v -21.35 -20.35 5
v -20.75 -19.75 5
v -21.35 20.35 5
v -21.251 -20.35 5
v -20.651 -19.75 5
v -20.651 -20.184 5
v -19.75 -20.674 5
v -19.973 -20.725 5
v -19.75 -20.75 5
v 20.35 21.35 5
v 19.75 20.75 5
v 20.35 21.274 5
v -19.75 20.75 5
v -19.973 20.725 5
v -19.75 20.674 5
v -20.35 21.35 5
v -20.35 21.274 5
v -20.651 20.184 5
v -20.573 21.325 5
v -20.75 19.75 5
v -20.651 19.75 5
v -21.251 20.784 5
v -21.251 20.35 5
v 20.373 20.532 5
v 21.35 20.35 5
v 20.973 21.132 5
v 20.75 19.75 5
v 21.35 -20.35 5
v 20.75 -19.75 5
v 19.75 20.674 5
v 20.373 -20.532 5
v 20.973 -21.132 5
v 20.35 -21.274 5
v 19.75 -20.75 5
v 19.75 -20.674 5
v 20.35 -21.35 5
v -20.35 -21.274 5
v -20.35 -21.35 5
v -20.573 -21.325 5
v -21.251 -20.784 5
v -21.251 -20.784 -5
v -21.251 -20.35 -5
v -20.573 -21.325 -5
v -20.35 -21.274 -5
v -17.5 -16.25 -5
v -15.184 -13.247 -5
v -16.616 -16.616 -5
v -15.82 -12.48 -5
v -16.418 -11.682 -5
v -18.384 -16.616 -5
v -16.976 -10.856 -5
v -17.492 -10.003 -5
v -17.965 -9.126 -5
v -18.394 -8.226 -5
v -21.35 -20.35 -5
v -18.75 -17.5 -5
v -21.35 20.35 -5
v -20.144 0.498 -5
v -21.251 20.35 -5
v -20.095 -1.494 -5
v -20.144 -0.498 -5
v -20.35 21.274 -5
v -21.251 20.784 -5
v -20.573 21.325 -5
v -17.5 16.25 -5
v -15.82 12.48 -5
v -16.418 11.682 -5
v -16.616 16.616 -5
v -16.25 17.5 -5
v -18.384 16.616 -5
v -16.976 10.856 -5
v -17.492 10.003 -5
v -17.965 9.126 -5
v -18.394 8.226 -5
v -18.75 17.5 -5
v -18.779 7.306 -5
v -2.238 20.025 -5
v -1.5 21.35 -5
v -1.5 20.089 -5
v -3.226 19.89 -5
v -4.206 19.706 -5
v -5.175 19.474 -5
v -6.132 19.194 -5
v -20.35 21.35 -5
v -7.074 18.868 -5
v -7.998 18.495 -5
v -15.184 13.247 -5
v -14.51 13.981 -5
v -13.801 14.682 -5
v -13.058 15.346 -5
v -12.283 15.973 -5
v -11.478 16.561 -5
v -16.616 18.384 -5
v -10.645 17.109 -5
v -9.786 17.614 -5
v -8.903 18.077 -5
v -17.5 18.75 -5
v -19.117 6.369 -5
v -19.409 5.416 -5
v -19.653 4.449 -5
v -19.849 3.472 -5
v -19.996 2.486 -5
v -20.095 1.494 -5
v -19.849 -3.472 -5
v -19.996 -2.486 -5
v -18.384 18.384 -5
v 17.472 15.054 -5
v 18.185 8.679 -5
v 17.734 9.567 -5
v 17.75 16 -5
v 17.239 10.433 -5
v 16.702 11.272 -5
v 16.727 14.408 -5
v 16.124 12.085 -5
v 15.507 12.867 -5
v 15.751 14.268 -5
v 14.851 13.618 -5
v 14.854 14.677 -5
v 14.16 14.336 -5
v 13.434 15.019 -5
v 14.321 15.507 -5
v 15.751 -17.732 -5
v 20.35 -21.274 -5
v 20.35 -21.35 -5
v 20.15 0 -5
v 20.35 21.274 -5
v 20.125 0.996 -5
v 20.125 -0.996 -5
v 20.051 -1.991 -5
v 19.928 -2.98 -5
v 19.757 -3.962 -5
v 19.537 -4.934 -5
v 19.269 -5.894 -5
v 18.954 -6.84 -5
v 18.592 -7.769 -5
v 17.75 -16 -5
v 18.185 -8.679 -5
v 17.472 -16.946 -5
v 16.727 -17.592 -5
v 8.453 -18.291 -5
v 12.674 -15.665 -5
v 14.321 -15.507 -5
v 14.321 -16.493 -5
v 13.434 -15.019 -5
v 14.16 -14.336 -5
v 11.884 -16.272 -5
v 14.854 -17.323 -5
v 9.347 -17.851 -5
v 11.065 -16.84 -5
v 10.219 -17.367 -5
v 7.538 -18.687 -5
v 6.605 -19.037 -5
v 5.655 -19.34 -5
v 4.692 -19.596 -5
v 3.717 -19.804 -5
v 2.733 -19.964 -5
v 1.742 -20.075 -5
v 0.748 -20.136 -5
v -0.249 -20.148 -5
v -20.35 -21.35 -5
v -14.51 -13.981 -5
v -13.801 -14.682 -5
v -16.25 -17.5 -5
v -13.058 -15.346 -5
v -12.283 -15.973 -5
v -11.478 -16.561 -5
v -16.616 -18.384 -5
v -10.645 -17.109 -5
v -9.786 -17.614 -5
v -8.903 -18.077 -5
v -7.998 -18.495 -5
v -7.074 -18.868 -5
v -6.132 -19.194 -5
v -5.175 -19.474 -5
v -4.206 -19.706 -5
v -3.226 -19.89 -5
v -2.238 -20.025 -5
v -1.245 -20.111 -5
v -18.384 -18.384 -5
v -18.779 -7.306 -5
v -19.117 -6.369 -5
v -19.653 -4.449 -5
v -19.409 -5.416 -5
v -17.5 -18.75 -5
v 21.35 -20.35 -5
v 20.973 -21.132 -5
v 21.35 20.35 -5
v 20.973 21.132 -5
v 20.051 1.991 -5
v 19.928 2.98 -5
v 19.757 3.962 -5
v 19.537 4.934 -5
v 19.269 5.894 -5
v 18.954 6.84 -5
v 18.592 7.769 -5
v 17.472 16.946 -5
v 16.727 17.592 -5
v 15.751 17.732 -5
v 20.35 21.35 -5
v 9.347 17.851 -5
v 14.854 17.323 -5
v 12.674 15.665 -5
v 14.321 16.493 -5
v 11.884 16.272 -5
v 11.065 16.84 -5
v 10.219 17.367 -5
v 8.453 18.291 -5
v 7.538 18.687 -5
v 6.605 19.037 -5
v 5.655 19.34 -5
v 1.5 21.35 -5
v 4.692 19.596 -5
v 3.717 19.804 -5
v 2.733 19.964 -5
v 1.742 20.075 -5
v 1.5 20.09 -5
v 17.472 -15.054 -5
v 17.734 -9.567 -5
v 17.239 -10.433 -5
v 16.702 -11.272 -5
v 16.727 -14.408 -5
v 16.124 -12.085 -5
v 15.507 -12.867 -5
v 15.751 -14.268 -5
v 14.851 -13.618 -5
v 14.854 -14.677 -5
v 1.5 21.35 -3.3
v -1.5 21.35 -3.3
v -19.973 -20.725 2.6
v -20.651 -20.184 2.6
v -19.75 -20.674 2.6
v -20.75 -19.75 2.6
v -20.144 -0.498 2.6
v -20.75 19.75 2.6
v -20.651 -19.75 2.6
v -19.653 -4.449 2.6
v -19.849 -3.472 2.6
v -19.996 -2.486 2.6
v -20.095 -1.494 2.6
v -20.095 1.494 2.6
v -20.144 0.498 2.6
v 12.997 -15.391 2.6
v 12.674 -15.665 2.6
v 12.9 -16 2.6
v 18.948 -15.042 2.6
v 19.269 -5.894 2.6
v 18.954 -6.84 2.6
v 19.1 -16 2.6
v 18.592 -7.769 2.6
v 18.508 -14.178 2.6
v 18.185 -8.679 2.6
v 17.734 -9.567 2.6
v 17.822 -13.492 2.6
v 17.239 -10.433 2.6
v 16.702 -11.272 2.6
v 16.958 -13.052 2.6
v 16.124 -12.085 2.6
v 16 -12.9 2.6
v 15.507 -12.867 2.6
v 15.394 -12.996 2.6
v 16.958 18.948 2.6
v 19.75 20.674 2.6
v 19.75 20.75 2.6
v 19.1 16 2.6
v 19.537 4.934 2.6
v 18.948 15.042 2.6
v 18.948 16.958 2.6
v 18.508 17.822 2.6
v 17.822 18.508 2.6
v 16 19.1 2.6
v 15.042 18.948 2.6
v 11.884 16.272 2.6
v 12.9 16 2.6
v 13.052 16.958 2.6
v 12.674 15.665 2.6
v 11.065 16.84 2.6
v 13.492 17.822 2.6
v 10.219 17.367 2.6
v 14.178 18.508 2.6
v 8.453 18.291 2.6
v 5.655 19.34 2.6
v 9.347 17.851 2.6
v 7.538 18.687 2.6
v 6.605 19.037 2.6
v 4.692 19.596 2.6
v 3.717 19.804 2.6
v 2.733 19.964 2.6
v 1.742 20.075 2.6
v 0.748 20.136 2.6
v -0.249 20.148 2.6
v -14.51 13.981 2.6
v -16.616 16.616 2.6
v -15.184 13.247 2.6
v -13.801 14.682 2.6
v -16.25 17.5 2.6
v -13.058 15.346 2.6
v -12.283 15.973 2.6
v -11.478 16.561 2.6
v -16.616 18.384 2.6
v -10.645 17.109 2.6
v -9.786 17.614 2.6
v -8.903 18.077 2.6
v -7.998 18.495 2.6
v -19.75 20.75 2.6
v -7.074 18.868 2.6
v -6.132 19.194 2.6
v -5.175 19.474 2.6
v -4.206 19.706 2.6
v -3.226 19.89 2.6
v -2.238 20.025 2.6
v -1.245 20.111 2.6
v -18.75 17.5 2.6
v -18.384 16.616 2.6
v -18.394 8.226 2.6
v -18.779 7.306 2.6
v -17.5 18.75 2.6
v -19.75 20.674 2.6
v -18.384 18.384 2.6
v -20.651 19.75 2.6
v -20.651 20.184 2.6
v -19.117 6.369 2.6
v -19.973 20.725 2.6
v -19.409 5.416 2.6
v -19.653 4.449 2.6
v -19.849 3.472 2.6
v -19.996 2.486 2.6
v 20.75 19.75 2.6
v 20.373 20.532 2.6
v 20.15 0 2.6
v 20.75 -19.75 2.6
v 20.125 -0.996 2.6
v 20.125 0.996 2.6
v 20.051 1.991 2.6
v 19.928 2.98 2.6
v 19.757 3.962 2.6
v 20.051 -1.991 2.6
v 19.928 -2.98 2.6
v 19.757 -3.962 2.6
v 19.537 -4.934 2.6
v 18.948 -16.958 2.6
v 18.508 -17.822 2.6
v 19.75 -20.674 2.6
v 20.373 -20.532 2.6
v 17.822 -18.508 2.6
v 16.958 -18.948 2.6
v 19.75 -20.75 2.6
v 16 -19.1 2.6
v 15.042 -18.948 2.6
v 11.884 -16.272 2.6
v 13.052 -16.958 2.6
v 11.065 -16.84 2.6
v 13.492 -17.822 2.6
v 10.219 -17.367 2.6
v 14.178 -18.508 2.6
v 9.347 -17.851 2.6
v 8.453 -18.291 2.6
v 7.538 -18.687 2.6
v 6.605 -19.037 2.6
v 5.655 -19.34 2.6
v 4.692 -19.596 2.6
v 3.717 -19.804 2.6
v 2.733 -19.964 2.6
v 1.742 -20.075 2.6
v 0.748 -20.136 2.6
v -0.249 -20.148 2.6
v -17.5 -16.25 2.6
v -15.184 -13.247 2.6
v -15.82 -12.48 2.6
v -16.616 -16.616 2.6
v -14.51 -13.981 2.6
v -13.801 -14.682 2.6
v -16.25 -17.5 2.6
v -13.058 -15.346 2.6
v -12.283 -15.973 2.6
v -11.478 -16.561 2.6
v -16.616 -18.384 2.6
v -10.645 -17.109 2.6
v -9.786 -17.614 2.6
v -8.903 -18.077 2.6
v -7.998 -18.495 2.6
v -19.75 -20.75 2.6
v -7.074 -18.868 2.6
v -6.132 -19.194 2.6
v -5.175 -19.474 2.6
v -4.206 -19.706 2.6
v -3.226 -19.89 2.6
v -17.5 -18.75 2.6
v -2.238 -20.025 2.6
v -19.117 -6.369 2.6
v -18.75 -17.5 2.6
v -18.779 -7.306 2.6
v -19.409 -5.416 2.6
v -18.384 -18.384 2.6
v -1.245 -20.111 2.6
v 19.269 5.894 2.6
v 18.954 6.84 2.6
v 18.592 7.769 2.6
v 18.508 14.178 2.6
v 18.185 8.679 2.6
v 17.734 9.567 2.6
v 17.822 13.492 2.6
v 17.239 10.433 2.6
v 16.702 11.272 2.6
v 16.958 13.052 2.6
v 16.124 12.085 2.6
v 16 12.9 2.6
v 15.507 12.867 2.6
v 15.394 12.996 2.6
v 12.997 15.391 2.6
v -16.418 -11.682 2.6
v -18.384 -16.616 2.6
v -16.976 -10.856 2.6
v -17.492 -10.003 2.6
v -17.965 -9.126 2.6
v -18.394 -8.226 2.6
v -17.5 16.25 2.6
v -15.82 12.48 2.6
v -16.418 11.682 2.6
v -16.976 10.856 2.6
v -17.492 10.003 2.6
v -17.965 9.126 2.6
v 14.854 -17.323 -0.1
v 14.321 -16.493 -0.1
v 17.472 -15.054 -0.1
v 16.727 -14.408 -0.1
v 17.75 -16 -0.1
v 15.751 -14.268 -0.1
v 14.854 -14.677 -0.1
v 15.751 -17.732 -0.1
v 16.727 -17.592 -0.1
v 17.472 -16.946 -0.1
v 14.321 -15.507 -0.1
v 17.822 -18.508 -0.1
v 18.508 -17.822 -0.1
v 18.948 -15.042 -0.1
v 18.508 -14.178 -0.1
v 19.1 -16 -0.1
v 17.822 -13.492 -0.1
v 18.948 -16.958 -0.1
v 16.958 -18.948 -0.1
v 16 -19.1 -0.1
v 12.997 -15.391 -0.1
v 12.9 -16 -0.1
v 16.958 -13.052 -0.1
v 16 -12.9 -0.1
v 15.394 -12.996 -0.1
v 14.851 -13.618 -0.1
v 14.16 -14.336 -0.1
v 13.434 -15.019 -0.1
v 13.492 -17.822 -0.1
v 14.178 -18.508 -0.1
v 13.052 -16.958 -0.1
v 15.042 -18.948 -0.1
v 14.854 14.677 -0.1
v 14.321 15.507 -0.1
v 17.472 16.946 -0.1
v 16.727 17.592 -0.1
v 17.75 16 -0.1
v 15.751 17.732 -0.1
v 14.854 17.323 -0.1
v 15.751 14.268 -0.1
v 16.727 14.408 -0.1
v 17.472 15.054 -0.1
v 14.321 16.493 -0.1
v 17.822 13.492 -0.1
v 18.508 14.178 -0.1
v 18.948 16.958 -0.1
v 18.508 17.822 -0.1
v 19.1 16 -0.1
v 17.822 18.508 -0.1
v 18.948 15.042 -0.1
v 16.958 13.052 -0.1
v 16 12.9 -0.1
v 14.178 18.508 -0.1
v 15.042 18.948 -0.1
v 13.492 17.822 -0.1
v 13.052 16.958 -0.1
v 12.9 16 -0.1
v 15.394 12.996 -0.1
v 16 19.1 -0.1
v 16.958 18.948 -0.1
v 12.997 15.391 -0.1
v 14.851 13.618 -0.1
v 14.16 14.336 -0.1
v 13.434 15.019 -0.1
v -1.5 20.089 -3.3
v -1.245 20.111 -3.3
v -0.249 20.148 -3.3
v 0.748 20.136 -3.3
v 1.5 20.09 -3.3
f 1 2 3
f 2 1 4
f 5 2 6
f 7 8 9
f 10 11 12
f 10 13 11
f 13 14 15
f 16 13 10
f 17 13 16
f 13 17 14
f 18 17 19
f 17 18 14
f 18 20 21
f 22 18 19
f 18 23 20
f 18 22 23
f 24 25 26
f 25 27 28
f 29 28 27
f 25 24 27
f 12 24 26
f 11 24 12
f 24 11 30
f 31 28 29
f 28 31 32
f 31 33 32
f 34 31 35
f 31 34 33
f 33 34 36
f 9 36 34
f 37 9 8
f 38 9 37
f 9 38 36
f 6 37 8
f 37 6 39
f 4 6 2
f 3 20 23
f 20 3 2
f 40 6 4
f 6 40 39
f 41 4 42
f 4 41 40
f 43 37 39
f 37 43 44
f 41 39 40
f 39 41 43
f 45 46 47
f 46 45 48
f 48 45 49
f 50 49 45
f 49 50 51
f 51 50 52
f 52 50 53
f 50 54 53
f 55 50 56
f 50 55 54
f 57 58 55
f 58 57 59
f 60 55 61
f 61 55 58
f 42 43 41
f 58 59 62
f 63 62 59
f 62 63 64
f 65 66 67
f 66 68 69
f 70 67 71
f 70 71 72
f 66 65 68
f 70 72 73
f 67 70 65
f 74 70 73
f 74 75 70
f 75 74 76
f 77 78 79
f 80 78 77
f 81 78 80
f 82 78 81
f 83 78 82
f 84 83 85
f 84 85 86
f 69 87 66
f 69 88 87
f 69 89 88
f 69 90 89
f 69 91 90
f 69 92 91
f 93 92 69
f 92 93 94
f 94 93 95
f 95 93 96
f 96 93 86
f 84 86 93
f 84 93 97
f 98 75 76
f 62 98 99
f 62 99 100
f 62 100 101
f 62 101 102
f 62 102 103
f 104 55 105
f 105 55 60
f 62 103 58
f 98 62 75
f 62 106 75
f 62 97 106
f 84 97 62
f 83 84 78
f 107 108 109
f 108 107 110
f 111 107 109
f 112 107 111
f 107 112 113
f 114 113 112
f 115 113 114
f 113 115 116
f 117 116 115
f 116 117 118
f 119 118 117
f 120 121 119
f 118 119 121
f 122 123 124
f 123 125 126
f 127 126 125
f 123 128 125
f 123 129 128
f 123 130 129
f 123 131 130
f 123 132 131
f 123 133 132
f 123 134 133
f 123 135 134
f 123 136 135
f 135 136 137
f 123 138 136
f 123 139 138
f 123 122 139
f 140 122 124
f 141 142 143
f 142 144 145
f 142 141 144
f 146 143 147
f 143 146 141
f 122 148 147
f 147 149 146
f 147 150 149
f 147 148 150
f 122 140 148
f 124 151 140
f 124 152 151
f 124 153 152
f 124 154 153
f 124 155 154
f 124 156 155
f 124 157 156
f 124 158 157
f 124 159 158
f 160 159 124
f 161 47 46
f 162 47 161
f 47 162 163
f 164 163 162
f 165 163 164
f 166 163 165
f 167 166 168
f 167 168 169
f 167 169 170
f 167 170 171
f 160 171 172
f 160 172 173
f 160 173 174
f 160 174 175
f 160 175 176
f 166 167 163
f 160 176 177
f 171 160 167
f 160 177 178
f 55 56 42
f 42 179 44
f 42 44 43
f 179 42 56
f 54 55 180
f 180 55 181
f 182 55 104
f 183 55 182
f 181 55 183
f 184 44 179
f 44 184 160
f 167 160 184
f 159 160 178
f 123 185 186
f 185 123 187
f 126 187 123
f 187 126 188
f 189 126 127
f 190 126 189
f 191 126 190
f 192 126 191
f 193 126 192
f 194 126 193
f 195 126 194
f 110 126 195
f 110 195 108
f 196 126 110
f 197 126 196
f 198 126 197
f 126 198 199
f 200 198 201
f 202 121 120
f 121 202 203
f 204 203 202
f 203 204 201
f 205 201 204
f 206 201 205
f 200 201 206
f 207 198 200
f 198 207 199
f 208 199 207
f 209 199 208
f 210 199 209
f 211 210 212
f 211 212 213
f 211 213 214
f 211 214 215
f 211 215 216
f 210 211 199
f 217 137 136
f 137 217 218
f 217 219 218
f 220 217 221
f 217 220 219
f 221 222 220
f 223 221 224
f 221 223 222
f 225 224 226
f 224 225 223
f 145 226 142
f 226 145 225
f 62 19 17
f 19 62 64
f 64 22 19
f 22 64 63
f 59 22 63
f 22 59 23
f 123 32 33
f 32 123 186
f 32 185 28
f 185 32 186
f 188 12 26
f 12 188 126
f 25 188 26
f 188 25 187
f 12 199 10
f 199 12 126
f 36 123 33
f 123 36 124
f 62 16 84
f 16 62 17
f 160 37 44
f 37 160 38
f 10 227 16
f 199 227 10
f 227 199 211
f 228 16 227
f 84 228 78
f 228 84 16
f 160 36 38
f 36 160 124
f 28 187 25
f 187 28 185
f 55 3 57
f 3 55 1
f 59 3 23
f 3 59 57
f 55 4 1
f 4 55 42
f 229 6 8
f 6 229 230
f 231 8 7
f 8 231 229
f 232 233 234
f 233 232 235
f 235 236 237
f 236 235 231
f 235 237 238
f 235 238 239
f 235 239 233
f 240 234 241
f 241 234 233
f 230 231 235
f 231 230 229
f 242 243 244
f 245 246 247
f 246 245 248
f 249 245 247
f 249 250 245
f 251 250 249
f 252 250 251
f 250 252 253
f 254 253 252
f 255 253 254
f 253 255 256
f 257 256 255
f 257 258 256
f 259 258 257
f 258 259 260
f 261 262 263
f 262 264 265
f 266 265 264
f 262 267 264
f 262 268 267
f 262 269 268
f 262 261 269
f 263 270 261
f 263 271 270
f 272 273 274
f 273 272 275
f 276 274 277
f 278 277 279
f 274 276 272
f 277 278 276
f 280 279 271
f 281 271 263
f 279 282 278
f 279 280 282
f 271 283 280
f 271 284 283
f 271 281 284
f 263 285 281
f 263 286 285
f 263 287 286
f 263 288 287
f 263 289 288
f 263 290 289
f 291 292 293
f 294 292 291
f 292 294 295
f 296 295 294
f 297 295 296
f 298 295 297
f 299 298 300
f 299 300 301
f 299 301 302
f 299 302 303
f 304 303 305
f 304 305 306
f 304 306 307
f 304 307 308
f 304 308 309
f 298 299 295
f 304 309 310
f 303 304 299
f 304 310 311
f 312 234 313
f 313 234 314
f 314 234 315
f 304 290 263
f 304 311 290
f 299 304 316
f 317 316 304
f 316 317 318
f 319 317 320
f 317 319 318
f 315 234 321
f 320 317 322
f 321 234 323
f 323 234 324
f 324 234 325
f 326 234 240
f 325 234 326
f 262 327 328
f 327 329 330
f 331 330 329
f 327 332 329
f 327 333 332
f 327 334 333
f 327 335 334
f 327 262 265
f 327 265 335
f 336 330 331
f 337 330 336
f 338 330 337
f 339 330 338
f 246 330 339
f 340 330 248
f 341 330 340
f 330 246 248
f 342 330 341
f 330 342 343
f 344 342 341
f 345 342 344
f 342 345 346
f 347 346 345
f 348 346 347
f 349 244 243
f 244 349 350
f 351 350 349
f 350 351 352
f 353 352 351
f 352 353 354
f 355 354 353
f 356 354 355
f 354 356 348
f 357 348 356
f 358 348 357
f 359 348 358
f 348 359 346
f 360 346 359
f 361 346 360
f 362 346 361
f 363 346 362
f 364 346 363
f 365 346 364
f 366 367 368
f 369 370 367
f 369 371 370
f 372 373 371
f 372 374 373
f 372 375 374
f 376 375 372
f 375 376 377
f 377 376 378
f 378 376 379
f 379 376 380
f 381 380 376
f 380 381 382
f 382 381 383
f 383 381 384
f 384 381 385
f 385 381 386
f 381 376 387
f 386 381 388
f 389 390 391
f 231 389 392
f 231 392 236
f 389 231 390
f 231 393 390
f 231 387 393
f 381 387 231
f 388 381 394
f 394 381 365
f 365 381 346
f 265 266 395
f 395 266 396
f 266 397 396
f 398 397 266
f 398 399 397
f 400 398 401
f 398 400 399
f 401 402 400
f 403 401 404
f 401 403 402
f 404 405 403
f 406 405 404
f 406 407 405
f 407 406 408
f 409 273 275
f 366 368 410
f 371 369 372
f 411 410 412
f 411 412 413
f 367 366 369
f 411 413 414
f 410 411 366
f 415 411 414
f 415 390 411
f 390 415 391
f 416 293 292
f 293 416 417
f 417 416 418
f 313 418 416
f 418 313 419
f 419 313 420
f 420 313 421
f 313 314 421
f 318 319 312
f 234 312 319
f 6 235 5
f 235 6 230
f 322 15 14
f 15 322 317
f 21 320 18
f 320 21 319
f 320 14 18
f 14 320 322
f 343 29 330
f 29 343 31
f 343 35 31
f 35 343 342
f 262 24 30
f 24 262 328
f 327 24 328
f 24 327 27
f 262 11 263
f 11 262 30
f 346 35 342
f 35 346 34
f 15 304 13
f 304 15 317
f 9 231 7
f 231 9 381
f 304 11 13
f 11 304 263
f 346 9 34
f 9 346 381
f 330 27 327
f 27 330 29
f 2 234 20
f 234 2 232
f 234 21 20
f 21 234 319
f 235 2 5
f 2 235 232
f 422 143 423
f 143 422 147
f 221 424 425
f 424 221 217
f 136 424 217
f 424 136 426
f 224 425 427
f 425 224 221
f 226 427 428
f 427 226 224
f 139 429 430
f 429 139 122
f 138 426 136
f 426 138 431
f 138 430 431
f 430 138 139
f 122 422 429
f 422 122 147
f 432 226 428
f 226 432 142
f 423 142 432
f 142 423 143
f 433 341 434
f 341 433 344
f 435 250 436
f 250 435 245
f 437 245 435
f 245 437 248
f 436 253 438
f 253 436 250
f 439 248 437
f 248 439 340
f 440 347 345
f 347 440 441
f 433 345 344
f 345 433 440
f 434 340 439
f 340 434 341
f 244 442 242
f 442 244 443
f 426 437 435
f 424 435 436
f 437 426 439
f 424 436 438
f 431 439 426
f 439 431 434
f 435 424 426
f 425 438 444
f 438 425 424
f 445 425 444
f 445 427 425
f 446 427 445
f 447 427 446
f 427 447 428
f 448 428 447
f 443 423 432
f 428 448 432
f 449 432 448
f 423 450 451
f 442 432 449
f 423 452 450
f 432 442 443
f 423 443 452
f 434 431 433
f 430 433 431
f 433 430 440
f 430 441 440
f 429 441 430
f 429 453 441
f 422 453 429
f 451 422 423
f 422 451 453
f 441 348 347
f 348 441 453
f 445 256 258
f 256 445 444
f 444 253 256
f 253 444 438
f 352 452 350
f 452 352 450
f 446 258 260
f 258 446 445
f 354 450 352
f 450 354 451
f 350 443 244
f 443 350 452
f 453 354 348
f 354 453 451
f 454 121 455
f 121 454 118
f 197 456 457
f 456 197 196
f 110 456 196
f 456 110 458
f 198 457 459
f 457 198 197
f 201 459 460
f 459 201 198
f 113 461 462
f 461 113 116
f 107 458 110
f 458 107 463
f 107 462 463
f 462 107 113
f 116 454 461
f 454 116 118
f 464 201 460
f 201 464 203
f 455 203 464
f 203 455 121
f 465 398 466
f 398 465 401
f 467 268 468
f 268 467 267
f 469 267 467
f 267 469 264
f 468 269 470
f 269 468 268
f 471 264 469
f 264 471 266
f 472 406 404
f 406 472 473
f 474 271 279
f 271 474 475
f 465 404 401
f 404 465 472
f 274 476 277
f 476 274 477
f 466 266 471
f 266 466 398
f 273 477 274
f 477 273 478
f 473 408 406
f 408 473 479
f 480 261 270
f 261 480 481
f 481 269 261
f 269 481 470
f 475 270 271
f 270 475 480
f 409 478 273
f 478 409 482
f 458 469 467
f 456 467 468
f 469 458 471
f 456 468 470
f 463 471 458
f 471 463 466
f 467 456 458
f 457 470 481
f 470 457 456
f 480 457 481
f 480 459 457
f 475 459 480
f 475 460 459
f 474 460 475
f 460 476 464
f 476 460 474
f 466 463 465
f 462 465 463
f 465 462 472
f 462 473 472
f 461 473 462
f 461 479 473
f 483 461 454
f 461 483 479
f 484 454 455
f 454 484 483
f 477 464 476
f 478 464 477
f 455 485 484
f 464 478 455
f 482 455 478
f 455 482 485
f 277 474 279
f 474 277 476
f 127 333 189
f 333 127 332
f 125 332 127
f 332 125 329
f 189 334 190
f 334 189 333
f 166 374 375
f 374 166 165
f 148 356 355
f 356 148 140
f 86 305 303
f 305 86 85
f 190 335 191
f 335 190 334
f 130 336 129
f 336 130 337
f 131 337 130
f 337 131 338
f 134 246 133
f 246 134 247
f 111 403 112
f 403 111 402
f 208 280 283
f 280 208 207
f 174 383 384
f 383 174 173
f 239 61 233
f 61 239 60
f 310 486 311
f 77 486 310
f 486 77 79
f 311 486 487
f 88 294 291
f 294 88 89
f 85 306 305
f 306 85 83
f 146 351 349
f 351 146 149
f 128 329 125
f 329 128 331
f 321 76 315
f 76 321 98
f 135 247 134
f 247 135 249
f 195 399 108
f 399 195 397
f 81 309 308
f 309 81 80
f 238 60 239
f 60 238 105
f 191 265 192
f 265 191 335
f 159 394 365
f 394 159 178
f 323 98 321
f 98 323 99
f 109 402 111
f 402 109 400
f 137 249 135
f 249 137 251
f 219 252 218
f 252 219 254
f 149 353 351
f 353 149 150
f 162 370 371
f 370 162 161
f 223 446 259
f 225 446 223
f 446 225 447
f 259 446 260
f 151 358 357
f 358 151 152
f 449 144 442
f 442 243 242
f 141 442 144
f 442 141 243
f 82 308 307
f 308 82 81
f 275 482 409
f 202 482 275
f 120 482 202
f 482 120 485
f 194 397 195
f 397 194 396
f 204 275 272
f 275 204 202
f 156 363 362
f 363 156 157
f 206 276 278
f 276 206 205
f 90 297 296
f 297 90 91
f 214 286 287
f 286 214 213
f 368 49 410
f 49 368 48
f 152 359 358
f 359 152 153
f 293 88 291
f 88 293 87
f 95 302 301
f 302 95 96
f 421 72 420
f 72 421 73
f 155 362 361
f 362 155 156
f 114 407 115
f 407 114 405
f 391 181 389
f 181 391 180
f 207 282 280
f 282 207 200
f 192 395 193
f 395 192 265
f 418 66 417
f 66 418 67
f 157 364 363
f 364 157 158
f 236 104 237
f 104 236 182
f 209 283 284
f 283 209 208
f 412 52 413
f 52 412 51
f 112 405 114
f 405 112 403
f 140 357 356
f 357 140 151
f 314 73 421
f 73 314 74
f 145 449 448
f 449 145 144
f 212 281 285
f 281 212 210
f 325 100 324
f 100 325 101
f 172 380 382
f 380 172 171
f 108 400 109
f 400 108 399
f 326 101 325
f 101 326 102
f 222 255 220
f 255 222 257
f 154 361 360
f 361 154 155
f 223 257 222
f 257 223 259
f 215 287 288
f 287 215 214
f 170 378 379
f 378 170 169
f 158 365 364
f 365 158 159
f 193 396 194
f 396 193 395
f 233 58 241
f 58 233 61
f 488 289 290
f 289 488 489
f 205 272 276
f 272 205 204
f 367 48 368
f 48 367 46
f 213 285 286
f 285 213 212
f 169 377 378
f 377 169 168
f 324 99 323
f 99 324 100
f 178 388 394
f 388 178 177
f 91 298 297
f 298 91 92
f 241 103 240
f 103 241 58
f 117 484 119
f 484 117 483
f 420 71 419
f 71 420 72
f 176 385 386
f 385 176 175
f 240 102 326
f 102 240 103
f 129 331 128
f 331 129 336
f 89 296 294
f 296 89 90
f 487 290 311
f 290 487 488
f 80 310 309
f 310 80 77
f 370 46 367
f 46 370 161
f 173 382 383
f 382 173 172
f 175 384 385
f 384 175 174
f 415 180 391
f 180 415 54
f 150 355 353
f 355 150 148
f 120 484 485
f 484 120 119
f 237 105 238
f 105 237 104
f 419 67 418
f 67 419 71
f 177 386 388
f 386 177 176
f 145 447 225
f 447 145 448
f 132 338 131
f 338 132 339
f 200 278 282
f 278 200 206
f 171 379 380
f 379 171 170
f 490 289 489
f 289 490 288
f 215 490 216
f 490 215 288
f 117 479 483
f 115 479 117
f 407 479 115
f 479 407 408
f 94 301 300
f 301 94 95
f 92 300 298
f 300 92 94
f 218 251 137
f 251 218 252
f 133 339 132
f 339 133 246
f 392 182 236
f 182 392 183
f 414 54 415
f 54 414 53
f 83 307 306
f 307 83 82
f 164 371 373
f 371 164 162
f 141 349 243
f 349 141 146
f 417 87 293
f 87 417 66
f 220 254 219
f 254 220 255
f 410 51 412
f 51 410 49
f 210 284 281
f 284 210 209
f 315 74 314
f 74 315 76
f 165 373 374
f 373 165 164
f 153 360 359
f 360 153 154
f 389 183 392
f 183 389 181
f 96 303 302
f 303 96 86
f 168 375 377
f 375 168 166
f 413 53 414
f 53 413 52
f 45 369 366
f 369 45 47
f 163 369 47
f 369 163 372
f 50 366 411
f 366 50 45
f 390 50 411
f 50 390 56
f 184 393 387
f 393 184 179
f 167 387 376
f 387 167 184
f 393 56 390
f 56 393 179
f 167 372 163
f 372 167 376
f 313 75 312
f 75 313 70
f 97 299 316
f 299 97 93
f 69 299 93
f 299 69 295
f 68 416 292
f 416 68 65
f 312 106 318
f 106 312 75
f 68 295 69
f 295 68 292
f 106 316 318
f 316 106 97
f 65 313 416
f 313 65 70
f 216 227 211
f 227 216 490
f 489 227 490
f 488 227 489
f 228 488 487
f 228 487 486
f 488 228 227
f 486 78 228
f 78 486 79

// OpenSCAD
// [FL_INDEX: keywords="openscad, 3d_parametric, VGA_fan_adapter, csg_solid" | COT="Parametric OpenSCAD design from 3DCodeverse"]
// Title: VGA fan adapter

use <MCAD/boxes.scad>;

/* [Global] */
// What is the fan size?
fan_w=40;//[40,50]

// What is the position of the holes?
holes = "side";// [fan:Regular fan only, vga:VGA fan only, both:Both fans, cross:Cross position, side:On one side]

/* [Hidden] */
$fs=1;
$fa=1.5;

wall_w = 1.2;
vga_w = 41.5;
vga_h = 10;
vga_int_h = vga_h - 2.4;
vga_hole = 35;
fan_hole = fan_w * 0.8;
vga_hole_d = 2.5;
fan_hole_d = 3.5;
fan_nut_d = 6.2;
fan_nut_h = 3;
wire_w = 3;
wire_h = 1.7;


difference()
{
	if(vga_w > fan_w)
	{
		roundedBox([vga_w + wall_w, vga_w + wall_w, vga_h],1,true);
	}
	else
	{
		roundedBox([fan_w + wall_w, fan_w + wall_w, vga_h],1,true);
	}
	union()
	{
		translate([0,0, vga_int_h/2+1]) roundedBox([vga_w, vga_w, vga_h - vga_int_h + 2],1,true);
		cylinder(r = (vga_w-wall_w)/2, h = vga_h+2, center = true);
		if( holes == "vga" || holes == "cross" || holes == "both"  || holes == "side")
		{
			translate([ -vga_hole/2, -vga_hole/2, 0])
				cylinder(r = vga_hole_d/2, h = vga_h+2, center = true);
		}
		if( holes == "vga" || holes == "cross" || holes == "both" )
		{
			translate([  vga_hole/2,  vga_hole/2, 0])
				cylinder(r = vga_hole_d/2, h = vga_h+2, center = true);
		}
		if( holes == "vga" || holes == "both" )
		{
			translate([  vga_hole/2, -vga_hole/2, 0])
				cylinder(r = vga_hole_d/2, h = vga_h+2, center = true);
		}
		if( holes == "vga" || holes == "both"  || holes == "side" )
		{
			translate([ -vga_hole/2,  vga_hole/2, 0])
				cylinder(r = vga_hole_d/2, h = vga_h+2, center = true);
		}

		if( holes == "fan" || holes == "cross" || holes == "both" )
		{
			translate([ -fan_hole/2,  fan_hole/2, 0])
			{
				cylinder(r = fan_hole_d/2, h = vga_h+2, center = true);
				translate([ 0, 0, vga_int_h/2-(vga_h-vga_int_h)+2])
					cylinder(r = fan_nut_d/2, h = fan_nut_h+4, center = true);
			}
		}
		if( holes == "fan" || holes == "cross" || holes == "both" || holes == "side" )
		{
			translate([  fan_hole/2,  -fan_hole/2, 0])
			{
				cylinder(r = fan_hole_d/2, h = vga_h+2, center = true);
				translate([ 0, 0, vga_int_h/2-(vga_h-vga_int_h)+2])
					cylinder(r = fan_nut_d/2, h = fan_nut_h+4, center = true);
			}
		}
		if( holes == "fan" || holes == "both"  || holes == "side" )
		{
			translate([  fan_hole/2,  fan_hole/2, 0])
			{
				cylinder(r = fan_hole_d/2, h = vga_h+2, center = true);
				translate([ 0, 0, vga_int_h/2-(vga_h-vga_int_h)+2])
					cylinder(r = fan_nut_d/2, h = fan_nut_h+4, center = true);
			}
		}
		if( holes == "fan" || holes == "both" )
		{
			translate([ -fan_hole/2,  -fan_hole/2, 0])
			{
				cylinder(r = fan_hole_d/2, h = vga_h+2, center = true);
				translate([ 0, 0, vga_int_h/2-(vga_h-vga_int_h)+2])
					cylinder(r = fan_nut_d/2, h = fan_nut_h+4, center = true);
			}
		}
		translate([-wire_w/2, 0, - vga_h/2 - 1])
			cube([wire_w,	vga_w + fan_w, wire_h + 1]);
	}
}
